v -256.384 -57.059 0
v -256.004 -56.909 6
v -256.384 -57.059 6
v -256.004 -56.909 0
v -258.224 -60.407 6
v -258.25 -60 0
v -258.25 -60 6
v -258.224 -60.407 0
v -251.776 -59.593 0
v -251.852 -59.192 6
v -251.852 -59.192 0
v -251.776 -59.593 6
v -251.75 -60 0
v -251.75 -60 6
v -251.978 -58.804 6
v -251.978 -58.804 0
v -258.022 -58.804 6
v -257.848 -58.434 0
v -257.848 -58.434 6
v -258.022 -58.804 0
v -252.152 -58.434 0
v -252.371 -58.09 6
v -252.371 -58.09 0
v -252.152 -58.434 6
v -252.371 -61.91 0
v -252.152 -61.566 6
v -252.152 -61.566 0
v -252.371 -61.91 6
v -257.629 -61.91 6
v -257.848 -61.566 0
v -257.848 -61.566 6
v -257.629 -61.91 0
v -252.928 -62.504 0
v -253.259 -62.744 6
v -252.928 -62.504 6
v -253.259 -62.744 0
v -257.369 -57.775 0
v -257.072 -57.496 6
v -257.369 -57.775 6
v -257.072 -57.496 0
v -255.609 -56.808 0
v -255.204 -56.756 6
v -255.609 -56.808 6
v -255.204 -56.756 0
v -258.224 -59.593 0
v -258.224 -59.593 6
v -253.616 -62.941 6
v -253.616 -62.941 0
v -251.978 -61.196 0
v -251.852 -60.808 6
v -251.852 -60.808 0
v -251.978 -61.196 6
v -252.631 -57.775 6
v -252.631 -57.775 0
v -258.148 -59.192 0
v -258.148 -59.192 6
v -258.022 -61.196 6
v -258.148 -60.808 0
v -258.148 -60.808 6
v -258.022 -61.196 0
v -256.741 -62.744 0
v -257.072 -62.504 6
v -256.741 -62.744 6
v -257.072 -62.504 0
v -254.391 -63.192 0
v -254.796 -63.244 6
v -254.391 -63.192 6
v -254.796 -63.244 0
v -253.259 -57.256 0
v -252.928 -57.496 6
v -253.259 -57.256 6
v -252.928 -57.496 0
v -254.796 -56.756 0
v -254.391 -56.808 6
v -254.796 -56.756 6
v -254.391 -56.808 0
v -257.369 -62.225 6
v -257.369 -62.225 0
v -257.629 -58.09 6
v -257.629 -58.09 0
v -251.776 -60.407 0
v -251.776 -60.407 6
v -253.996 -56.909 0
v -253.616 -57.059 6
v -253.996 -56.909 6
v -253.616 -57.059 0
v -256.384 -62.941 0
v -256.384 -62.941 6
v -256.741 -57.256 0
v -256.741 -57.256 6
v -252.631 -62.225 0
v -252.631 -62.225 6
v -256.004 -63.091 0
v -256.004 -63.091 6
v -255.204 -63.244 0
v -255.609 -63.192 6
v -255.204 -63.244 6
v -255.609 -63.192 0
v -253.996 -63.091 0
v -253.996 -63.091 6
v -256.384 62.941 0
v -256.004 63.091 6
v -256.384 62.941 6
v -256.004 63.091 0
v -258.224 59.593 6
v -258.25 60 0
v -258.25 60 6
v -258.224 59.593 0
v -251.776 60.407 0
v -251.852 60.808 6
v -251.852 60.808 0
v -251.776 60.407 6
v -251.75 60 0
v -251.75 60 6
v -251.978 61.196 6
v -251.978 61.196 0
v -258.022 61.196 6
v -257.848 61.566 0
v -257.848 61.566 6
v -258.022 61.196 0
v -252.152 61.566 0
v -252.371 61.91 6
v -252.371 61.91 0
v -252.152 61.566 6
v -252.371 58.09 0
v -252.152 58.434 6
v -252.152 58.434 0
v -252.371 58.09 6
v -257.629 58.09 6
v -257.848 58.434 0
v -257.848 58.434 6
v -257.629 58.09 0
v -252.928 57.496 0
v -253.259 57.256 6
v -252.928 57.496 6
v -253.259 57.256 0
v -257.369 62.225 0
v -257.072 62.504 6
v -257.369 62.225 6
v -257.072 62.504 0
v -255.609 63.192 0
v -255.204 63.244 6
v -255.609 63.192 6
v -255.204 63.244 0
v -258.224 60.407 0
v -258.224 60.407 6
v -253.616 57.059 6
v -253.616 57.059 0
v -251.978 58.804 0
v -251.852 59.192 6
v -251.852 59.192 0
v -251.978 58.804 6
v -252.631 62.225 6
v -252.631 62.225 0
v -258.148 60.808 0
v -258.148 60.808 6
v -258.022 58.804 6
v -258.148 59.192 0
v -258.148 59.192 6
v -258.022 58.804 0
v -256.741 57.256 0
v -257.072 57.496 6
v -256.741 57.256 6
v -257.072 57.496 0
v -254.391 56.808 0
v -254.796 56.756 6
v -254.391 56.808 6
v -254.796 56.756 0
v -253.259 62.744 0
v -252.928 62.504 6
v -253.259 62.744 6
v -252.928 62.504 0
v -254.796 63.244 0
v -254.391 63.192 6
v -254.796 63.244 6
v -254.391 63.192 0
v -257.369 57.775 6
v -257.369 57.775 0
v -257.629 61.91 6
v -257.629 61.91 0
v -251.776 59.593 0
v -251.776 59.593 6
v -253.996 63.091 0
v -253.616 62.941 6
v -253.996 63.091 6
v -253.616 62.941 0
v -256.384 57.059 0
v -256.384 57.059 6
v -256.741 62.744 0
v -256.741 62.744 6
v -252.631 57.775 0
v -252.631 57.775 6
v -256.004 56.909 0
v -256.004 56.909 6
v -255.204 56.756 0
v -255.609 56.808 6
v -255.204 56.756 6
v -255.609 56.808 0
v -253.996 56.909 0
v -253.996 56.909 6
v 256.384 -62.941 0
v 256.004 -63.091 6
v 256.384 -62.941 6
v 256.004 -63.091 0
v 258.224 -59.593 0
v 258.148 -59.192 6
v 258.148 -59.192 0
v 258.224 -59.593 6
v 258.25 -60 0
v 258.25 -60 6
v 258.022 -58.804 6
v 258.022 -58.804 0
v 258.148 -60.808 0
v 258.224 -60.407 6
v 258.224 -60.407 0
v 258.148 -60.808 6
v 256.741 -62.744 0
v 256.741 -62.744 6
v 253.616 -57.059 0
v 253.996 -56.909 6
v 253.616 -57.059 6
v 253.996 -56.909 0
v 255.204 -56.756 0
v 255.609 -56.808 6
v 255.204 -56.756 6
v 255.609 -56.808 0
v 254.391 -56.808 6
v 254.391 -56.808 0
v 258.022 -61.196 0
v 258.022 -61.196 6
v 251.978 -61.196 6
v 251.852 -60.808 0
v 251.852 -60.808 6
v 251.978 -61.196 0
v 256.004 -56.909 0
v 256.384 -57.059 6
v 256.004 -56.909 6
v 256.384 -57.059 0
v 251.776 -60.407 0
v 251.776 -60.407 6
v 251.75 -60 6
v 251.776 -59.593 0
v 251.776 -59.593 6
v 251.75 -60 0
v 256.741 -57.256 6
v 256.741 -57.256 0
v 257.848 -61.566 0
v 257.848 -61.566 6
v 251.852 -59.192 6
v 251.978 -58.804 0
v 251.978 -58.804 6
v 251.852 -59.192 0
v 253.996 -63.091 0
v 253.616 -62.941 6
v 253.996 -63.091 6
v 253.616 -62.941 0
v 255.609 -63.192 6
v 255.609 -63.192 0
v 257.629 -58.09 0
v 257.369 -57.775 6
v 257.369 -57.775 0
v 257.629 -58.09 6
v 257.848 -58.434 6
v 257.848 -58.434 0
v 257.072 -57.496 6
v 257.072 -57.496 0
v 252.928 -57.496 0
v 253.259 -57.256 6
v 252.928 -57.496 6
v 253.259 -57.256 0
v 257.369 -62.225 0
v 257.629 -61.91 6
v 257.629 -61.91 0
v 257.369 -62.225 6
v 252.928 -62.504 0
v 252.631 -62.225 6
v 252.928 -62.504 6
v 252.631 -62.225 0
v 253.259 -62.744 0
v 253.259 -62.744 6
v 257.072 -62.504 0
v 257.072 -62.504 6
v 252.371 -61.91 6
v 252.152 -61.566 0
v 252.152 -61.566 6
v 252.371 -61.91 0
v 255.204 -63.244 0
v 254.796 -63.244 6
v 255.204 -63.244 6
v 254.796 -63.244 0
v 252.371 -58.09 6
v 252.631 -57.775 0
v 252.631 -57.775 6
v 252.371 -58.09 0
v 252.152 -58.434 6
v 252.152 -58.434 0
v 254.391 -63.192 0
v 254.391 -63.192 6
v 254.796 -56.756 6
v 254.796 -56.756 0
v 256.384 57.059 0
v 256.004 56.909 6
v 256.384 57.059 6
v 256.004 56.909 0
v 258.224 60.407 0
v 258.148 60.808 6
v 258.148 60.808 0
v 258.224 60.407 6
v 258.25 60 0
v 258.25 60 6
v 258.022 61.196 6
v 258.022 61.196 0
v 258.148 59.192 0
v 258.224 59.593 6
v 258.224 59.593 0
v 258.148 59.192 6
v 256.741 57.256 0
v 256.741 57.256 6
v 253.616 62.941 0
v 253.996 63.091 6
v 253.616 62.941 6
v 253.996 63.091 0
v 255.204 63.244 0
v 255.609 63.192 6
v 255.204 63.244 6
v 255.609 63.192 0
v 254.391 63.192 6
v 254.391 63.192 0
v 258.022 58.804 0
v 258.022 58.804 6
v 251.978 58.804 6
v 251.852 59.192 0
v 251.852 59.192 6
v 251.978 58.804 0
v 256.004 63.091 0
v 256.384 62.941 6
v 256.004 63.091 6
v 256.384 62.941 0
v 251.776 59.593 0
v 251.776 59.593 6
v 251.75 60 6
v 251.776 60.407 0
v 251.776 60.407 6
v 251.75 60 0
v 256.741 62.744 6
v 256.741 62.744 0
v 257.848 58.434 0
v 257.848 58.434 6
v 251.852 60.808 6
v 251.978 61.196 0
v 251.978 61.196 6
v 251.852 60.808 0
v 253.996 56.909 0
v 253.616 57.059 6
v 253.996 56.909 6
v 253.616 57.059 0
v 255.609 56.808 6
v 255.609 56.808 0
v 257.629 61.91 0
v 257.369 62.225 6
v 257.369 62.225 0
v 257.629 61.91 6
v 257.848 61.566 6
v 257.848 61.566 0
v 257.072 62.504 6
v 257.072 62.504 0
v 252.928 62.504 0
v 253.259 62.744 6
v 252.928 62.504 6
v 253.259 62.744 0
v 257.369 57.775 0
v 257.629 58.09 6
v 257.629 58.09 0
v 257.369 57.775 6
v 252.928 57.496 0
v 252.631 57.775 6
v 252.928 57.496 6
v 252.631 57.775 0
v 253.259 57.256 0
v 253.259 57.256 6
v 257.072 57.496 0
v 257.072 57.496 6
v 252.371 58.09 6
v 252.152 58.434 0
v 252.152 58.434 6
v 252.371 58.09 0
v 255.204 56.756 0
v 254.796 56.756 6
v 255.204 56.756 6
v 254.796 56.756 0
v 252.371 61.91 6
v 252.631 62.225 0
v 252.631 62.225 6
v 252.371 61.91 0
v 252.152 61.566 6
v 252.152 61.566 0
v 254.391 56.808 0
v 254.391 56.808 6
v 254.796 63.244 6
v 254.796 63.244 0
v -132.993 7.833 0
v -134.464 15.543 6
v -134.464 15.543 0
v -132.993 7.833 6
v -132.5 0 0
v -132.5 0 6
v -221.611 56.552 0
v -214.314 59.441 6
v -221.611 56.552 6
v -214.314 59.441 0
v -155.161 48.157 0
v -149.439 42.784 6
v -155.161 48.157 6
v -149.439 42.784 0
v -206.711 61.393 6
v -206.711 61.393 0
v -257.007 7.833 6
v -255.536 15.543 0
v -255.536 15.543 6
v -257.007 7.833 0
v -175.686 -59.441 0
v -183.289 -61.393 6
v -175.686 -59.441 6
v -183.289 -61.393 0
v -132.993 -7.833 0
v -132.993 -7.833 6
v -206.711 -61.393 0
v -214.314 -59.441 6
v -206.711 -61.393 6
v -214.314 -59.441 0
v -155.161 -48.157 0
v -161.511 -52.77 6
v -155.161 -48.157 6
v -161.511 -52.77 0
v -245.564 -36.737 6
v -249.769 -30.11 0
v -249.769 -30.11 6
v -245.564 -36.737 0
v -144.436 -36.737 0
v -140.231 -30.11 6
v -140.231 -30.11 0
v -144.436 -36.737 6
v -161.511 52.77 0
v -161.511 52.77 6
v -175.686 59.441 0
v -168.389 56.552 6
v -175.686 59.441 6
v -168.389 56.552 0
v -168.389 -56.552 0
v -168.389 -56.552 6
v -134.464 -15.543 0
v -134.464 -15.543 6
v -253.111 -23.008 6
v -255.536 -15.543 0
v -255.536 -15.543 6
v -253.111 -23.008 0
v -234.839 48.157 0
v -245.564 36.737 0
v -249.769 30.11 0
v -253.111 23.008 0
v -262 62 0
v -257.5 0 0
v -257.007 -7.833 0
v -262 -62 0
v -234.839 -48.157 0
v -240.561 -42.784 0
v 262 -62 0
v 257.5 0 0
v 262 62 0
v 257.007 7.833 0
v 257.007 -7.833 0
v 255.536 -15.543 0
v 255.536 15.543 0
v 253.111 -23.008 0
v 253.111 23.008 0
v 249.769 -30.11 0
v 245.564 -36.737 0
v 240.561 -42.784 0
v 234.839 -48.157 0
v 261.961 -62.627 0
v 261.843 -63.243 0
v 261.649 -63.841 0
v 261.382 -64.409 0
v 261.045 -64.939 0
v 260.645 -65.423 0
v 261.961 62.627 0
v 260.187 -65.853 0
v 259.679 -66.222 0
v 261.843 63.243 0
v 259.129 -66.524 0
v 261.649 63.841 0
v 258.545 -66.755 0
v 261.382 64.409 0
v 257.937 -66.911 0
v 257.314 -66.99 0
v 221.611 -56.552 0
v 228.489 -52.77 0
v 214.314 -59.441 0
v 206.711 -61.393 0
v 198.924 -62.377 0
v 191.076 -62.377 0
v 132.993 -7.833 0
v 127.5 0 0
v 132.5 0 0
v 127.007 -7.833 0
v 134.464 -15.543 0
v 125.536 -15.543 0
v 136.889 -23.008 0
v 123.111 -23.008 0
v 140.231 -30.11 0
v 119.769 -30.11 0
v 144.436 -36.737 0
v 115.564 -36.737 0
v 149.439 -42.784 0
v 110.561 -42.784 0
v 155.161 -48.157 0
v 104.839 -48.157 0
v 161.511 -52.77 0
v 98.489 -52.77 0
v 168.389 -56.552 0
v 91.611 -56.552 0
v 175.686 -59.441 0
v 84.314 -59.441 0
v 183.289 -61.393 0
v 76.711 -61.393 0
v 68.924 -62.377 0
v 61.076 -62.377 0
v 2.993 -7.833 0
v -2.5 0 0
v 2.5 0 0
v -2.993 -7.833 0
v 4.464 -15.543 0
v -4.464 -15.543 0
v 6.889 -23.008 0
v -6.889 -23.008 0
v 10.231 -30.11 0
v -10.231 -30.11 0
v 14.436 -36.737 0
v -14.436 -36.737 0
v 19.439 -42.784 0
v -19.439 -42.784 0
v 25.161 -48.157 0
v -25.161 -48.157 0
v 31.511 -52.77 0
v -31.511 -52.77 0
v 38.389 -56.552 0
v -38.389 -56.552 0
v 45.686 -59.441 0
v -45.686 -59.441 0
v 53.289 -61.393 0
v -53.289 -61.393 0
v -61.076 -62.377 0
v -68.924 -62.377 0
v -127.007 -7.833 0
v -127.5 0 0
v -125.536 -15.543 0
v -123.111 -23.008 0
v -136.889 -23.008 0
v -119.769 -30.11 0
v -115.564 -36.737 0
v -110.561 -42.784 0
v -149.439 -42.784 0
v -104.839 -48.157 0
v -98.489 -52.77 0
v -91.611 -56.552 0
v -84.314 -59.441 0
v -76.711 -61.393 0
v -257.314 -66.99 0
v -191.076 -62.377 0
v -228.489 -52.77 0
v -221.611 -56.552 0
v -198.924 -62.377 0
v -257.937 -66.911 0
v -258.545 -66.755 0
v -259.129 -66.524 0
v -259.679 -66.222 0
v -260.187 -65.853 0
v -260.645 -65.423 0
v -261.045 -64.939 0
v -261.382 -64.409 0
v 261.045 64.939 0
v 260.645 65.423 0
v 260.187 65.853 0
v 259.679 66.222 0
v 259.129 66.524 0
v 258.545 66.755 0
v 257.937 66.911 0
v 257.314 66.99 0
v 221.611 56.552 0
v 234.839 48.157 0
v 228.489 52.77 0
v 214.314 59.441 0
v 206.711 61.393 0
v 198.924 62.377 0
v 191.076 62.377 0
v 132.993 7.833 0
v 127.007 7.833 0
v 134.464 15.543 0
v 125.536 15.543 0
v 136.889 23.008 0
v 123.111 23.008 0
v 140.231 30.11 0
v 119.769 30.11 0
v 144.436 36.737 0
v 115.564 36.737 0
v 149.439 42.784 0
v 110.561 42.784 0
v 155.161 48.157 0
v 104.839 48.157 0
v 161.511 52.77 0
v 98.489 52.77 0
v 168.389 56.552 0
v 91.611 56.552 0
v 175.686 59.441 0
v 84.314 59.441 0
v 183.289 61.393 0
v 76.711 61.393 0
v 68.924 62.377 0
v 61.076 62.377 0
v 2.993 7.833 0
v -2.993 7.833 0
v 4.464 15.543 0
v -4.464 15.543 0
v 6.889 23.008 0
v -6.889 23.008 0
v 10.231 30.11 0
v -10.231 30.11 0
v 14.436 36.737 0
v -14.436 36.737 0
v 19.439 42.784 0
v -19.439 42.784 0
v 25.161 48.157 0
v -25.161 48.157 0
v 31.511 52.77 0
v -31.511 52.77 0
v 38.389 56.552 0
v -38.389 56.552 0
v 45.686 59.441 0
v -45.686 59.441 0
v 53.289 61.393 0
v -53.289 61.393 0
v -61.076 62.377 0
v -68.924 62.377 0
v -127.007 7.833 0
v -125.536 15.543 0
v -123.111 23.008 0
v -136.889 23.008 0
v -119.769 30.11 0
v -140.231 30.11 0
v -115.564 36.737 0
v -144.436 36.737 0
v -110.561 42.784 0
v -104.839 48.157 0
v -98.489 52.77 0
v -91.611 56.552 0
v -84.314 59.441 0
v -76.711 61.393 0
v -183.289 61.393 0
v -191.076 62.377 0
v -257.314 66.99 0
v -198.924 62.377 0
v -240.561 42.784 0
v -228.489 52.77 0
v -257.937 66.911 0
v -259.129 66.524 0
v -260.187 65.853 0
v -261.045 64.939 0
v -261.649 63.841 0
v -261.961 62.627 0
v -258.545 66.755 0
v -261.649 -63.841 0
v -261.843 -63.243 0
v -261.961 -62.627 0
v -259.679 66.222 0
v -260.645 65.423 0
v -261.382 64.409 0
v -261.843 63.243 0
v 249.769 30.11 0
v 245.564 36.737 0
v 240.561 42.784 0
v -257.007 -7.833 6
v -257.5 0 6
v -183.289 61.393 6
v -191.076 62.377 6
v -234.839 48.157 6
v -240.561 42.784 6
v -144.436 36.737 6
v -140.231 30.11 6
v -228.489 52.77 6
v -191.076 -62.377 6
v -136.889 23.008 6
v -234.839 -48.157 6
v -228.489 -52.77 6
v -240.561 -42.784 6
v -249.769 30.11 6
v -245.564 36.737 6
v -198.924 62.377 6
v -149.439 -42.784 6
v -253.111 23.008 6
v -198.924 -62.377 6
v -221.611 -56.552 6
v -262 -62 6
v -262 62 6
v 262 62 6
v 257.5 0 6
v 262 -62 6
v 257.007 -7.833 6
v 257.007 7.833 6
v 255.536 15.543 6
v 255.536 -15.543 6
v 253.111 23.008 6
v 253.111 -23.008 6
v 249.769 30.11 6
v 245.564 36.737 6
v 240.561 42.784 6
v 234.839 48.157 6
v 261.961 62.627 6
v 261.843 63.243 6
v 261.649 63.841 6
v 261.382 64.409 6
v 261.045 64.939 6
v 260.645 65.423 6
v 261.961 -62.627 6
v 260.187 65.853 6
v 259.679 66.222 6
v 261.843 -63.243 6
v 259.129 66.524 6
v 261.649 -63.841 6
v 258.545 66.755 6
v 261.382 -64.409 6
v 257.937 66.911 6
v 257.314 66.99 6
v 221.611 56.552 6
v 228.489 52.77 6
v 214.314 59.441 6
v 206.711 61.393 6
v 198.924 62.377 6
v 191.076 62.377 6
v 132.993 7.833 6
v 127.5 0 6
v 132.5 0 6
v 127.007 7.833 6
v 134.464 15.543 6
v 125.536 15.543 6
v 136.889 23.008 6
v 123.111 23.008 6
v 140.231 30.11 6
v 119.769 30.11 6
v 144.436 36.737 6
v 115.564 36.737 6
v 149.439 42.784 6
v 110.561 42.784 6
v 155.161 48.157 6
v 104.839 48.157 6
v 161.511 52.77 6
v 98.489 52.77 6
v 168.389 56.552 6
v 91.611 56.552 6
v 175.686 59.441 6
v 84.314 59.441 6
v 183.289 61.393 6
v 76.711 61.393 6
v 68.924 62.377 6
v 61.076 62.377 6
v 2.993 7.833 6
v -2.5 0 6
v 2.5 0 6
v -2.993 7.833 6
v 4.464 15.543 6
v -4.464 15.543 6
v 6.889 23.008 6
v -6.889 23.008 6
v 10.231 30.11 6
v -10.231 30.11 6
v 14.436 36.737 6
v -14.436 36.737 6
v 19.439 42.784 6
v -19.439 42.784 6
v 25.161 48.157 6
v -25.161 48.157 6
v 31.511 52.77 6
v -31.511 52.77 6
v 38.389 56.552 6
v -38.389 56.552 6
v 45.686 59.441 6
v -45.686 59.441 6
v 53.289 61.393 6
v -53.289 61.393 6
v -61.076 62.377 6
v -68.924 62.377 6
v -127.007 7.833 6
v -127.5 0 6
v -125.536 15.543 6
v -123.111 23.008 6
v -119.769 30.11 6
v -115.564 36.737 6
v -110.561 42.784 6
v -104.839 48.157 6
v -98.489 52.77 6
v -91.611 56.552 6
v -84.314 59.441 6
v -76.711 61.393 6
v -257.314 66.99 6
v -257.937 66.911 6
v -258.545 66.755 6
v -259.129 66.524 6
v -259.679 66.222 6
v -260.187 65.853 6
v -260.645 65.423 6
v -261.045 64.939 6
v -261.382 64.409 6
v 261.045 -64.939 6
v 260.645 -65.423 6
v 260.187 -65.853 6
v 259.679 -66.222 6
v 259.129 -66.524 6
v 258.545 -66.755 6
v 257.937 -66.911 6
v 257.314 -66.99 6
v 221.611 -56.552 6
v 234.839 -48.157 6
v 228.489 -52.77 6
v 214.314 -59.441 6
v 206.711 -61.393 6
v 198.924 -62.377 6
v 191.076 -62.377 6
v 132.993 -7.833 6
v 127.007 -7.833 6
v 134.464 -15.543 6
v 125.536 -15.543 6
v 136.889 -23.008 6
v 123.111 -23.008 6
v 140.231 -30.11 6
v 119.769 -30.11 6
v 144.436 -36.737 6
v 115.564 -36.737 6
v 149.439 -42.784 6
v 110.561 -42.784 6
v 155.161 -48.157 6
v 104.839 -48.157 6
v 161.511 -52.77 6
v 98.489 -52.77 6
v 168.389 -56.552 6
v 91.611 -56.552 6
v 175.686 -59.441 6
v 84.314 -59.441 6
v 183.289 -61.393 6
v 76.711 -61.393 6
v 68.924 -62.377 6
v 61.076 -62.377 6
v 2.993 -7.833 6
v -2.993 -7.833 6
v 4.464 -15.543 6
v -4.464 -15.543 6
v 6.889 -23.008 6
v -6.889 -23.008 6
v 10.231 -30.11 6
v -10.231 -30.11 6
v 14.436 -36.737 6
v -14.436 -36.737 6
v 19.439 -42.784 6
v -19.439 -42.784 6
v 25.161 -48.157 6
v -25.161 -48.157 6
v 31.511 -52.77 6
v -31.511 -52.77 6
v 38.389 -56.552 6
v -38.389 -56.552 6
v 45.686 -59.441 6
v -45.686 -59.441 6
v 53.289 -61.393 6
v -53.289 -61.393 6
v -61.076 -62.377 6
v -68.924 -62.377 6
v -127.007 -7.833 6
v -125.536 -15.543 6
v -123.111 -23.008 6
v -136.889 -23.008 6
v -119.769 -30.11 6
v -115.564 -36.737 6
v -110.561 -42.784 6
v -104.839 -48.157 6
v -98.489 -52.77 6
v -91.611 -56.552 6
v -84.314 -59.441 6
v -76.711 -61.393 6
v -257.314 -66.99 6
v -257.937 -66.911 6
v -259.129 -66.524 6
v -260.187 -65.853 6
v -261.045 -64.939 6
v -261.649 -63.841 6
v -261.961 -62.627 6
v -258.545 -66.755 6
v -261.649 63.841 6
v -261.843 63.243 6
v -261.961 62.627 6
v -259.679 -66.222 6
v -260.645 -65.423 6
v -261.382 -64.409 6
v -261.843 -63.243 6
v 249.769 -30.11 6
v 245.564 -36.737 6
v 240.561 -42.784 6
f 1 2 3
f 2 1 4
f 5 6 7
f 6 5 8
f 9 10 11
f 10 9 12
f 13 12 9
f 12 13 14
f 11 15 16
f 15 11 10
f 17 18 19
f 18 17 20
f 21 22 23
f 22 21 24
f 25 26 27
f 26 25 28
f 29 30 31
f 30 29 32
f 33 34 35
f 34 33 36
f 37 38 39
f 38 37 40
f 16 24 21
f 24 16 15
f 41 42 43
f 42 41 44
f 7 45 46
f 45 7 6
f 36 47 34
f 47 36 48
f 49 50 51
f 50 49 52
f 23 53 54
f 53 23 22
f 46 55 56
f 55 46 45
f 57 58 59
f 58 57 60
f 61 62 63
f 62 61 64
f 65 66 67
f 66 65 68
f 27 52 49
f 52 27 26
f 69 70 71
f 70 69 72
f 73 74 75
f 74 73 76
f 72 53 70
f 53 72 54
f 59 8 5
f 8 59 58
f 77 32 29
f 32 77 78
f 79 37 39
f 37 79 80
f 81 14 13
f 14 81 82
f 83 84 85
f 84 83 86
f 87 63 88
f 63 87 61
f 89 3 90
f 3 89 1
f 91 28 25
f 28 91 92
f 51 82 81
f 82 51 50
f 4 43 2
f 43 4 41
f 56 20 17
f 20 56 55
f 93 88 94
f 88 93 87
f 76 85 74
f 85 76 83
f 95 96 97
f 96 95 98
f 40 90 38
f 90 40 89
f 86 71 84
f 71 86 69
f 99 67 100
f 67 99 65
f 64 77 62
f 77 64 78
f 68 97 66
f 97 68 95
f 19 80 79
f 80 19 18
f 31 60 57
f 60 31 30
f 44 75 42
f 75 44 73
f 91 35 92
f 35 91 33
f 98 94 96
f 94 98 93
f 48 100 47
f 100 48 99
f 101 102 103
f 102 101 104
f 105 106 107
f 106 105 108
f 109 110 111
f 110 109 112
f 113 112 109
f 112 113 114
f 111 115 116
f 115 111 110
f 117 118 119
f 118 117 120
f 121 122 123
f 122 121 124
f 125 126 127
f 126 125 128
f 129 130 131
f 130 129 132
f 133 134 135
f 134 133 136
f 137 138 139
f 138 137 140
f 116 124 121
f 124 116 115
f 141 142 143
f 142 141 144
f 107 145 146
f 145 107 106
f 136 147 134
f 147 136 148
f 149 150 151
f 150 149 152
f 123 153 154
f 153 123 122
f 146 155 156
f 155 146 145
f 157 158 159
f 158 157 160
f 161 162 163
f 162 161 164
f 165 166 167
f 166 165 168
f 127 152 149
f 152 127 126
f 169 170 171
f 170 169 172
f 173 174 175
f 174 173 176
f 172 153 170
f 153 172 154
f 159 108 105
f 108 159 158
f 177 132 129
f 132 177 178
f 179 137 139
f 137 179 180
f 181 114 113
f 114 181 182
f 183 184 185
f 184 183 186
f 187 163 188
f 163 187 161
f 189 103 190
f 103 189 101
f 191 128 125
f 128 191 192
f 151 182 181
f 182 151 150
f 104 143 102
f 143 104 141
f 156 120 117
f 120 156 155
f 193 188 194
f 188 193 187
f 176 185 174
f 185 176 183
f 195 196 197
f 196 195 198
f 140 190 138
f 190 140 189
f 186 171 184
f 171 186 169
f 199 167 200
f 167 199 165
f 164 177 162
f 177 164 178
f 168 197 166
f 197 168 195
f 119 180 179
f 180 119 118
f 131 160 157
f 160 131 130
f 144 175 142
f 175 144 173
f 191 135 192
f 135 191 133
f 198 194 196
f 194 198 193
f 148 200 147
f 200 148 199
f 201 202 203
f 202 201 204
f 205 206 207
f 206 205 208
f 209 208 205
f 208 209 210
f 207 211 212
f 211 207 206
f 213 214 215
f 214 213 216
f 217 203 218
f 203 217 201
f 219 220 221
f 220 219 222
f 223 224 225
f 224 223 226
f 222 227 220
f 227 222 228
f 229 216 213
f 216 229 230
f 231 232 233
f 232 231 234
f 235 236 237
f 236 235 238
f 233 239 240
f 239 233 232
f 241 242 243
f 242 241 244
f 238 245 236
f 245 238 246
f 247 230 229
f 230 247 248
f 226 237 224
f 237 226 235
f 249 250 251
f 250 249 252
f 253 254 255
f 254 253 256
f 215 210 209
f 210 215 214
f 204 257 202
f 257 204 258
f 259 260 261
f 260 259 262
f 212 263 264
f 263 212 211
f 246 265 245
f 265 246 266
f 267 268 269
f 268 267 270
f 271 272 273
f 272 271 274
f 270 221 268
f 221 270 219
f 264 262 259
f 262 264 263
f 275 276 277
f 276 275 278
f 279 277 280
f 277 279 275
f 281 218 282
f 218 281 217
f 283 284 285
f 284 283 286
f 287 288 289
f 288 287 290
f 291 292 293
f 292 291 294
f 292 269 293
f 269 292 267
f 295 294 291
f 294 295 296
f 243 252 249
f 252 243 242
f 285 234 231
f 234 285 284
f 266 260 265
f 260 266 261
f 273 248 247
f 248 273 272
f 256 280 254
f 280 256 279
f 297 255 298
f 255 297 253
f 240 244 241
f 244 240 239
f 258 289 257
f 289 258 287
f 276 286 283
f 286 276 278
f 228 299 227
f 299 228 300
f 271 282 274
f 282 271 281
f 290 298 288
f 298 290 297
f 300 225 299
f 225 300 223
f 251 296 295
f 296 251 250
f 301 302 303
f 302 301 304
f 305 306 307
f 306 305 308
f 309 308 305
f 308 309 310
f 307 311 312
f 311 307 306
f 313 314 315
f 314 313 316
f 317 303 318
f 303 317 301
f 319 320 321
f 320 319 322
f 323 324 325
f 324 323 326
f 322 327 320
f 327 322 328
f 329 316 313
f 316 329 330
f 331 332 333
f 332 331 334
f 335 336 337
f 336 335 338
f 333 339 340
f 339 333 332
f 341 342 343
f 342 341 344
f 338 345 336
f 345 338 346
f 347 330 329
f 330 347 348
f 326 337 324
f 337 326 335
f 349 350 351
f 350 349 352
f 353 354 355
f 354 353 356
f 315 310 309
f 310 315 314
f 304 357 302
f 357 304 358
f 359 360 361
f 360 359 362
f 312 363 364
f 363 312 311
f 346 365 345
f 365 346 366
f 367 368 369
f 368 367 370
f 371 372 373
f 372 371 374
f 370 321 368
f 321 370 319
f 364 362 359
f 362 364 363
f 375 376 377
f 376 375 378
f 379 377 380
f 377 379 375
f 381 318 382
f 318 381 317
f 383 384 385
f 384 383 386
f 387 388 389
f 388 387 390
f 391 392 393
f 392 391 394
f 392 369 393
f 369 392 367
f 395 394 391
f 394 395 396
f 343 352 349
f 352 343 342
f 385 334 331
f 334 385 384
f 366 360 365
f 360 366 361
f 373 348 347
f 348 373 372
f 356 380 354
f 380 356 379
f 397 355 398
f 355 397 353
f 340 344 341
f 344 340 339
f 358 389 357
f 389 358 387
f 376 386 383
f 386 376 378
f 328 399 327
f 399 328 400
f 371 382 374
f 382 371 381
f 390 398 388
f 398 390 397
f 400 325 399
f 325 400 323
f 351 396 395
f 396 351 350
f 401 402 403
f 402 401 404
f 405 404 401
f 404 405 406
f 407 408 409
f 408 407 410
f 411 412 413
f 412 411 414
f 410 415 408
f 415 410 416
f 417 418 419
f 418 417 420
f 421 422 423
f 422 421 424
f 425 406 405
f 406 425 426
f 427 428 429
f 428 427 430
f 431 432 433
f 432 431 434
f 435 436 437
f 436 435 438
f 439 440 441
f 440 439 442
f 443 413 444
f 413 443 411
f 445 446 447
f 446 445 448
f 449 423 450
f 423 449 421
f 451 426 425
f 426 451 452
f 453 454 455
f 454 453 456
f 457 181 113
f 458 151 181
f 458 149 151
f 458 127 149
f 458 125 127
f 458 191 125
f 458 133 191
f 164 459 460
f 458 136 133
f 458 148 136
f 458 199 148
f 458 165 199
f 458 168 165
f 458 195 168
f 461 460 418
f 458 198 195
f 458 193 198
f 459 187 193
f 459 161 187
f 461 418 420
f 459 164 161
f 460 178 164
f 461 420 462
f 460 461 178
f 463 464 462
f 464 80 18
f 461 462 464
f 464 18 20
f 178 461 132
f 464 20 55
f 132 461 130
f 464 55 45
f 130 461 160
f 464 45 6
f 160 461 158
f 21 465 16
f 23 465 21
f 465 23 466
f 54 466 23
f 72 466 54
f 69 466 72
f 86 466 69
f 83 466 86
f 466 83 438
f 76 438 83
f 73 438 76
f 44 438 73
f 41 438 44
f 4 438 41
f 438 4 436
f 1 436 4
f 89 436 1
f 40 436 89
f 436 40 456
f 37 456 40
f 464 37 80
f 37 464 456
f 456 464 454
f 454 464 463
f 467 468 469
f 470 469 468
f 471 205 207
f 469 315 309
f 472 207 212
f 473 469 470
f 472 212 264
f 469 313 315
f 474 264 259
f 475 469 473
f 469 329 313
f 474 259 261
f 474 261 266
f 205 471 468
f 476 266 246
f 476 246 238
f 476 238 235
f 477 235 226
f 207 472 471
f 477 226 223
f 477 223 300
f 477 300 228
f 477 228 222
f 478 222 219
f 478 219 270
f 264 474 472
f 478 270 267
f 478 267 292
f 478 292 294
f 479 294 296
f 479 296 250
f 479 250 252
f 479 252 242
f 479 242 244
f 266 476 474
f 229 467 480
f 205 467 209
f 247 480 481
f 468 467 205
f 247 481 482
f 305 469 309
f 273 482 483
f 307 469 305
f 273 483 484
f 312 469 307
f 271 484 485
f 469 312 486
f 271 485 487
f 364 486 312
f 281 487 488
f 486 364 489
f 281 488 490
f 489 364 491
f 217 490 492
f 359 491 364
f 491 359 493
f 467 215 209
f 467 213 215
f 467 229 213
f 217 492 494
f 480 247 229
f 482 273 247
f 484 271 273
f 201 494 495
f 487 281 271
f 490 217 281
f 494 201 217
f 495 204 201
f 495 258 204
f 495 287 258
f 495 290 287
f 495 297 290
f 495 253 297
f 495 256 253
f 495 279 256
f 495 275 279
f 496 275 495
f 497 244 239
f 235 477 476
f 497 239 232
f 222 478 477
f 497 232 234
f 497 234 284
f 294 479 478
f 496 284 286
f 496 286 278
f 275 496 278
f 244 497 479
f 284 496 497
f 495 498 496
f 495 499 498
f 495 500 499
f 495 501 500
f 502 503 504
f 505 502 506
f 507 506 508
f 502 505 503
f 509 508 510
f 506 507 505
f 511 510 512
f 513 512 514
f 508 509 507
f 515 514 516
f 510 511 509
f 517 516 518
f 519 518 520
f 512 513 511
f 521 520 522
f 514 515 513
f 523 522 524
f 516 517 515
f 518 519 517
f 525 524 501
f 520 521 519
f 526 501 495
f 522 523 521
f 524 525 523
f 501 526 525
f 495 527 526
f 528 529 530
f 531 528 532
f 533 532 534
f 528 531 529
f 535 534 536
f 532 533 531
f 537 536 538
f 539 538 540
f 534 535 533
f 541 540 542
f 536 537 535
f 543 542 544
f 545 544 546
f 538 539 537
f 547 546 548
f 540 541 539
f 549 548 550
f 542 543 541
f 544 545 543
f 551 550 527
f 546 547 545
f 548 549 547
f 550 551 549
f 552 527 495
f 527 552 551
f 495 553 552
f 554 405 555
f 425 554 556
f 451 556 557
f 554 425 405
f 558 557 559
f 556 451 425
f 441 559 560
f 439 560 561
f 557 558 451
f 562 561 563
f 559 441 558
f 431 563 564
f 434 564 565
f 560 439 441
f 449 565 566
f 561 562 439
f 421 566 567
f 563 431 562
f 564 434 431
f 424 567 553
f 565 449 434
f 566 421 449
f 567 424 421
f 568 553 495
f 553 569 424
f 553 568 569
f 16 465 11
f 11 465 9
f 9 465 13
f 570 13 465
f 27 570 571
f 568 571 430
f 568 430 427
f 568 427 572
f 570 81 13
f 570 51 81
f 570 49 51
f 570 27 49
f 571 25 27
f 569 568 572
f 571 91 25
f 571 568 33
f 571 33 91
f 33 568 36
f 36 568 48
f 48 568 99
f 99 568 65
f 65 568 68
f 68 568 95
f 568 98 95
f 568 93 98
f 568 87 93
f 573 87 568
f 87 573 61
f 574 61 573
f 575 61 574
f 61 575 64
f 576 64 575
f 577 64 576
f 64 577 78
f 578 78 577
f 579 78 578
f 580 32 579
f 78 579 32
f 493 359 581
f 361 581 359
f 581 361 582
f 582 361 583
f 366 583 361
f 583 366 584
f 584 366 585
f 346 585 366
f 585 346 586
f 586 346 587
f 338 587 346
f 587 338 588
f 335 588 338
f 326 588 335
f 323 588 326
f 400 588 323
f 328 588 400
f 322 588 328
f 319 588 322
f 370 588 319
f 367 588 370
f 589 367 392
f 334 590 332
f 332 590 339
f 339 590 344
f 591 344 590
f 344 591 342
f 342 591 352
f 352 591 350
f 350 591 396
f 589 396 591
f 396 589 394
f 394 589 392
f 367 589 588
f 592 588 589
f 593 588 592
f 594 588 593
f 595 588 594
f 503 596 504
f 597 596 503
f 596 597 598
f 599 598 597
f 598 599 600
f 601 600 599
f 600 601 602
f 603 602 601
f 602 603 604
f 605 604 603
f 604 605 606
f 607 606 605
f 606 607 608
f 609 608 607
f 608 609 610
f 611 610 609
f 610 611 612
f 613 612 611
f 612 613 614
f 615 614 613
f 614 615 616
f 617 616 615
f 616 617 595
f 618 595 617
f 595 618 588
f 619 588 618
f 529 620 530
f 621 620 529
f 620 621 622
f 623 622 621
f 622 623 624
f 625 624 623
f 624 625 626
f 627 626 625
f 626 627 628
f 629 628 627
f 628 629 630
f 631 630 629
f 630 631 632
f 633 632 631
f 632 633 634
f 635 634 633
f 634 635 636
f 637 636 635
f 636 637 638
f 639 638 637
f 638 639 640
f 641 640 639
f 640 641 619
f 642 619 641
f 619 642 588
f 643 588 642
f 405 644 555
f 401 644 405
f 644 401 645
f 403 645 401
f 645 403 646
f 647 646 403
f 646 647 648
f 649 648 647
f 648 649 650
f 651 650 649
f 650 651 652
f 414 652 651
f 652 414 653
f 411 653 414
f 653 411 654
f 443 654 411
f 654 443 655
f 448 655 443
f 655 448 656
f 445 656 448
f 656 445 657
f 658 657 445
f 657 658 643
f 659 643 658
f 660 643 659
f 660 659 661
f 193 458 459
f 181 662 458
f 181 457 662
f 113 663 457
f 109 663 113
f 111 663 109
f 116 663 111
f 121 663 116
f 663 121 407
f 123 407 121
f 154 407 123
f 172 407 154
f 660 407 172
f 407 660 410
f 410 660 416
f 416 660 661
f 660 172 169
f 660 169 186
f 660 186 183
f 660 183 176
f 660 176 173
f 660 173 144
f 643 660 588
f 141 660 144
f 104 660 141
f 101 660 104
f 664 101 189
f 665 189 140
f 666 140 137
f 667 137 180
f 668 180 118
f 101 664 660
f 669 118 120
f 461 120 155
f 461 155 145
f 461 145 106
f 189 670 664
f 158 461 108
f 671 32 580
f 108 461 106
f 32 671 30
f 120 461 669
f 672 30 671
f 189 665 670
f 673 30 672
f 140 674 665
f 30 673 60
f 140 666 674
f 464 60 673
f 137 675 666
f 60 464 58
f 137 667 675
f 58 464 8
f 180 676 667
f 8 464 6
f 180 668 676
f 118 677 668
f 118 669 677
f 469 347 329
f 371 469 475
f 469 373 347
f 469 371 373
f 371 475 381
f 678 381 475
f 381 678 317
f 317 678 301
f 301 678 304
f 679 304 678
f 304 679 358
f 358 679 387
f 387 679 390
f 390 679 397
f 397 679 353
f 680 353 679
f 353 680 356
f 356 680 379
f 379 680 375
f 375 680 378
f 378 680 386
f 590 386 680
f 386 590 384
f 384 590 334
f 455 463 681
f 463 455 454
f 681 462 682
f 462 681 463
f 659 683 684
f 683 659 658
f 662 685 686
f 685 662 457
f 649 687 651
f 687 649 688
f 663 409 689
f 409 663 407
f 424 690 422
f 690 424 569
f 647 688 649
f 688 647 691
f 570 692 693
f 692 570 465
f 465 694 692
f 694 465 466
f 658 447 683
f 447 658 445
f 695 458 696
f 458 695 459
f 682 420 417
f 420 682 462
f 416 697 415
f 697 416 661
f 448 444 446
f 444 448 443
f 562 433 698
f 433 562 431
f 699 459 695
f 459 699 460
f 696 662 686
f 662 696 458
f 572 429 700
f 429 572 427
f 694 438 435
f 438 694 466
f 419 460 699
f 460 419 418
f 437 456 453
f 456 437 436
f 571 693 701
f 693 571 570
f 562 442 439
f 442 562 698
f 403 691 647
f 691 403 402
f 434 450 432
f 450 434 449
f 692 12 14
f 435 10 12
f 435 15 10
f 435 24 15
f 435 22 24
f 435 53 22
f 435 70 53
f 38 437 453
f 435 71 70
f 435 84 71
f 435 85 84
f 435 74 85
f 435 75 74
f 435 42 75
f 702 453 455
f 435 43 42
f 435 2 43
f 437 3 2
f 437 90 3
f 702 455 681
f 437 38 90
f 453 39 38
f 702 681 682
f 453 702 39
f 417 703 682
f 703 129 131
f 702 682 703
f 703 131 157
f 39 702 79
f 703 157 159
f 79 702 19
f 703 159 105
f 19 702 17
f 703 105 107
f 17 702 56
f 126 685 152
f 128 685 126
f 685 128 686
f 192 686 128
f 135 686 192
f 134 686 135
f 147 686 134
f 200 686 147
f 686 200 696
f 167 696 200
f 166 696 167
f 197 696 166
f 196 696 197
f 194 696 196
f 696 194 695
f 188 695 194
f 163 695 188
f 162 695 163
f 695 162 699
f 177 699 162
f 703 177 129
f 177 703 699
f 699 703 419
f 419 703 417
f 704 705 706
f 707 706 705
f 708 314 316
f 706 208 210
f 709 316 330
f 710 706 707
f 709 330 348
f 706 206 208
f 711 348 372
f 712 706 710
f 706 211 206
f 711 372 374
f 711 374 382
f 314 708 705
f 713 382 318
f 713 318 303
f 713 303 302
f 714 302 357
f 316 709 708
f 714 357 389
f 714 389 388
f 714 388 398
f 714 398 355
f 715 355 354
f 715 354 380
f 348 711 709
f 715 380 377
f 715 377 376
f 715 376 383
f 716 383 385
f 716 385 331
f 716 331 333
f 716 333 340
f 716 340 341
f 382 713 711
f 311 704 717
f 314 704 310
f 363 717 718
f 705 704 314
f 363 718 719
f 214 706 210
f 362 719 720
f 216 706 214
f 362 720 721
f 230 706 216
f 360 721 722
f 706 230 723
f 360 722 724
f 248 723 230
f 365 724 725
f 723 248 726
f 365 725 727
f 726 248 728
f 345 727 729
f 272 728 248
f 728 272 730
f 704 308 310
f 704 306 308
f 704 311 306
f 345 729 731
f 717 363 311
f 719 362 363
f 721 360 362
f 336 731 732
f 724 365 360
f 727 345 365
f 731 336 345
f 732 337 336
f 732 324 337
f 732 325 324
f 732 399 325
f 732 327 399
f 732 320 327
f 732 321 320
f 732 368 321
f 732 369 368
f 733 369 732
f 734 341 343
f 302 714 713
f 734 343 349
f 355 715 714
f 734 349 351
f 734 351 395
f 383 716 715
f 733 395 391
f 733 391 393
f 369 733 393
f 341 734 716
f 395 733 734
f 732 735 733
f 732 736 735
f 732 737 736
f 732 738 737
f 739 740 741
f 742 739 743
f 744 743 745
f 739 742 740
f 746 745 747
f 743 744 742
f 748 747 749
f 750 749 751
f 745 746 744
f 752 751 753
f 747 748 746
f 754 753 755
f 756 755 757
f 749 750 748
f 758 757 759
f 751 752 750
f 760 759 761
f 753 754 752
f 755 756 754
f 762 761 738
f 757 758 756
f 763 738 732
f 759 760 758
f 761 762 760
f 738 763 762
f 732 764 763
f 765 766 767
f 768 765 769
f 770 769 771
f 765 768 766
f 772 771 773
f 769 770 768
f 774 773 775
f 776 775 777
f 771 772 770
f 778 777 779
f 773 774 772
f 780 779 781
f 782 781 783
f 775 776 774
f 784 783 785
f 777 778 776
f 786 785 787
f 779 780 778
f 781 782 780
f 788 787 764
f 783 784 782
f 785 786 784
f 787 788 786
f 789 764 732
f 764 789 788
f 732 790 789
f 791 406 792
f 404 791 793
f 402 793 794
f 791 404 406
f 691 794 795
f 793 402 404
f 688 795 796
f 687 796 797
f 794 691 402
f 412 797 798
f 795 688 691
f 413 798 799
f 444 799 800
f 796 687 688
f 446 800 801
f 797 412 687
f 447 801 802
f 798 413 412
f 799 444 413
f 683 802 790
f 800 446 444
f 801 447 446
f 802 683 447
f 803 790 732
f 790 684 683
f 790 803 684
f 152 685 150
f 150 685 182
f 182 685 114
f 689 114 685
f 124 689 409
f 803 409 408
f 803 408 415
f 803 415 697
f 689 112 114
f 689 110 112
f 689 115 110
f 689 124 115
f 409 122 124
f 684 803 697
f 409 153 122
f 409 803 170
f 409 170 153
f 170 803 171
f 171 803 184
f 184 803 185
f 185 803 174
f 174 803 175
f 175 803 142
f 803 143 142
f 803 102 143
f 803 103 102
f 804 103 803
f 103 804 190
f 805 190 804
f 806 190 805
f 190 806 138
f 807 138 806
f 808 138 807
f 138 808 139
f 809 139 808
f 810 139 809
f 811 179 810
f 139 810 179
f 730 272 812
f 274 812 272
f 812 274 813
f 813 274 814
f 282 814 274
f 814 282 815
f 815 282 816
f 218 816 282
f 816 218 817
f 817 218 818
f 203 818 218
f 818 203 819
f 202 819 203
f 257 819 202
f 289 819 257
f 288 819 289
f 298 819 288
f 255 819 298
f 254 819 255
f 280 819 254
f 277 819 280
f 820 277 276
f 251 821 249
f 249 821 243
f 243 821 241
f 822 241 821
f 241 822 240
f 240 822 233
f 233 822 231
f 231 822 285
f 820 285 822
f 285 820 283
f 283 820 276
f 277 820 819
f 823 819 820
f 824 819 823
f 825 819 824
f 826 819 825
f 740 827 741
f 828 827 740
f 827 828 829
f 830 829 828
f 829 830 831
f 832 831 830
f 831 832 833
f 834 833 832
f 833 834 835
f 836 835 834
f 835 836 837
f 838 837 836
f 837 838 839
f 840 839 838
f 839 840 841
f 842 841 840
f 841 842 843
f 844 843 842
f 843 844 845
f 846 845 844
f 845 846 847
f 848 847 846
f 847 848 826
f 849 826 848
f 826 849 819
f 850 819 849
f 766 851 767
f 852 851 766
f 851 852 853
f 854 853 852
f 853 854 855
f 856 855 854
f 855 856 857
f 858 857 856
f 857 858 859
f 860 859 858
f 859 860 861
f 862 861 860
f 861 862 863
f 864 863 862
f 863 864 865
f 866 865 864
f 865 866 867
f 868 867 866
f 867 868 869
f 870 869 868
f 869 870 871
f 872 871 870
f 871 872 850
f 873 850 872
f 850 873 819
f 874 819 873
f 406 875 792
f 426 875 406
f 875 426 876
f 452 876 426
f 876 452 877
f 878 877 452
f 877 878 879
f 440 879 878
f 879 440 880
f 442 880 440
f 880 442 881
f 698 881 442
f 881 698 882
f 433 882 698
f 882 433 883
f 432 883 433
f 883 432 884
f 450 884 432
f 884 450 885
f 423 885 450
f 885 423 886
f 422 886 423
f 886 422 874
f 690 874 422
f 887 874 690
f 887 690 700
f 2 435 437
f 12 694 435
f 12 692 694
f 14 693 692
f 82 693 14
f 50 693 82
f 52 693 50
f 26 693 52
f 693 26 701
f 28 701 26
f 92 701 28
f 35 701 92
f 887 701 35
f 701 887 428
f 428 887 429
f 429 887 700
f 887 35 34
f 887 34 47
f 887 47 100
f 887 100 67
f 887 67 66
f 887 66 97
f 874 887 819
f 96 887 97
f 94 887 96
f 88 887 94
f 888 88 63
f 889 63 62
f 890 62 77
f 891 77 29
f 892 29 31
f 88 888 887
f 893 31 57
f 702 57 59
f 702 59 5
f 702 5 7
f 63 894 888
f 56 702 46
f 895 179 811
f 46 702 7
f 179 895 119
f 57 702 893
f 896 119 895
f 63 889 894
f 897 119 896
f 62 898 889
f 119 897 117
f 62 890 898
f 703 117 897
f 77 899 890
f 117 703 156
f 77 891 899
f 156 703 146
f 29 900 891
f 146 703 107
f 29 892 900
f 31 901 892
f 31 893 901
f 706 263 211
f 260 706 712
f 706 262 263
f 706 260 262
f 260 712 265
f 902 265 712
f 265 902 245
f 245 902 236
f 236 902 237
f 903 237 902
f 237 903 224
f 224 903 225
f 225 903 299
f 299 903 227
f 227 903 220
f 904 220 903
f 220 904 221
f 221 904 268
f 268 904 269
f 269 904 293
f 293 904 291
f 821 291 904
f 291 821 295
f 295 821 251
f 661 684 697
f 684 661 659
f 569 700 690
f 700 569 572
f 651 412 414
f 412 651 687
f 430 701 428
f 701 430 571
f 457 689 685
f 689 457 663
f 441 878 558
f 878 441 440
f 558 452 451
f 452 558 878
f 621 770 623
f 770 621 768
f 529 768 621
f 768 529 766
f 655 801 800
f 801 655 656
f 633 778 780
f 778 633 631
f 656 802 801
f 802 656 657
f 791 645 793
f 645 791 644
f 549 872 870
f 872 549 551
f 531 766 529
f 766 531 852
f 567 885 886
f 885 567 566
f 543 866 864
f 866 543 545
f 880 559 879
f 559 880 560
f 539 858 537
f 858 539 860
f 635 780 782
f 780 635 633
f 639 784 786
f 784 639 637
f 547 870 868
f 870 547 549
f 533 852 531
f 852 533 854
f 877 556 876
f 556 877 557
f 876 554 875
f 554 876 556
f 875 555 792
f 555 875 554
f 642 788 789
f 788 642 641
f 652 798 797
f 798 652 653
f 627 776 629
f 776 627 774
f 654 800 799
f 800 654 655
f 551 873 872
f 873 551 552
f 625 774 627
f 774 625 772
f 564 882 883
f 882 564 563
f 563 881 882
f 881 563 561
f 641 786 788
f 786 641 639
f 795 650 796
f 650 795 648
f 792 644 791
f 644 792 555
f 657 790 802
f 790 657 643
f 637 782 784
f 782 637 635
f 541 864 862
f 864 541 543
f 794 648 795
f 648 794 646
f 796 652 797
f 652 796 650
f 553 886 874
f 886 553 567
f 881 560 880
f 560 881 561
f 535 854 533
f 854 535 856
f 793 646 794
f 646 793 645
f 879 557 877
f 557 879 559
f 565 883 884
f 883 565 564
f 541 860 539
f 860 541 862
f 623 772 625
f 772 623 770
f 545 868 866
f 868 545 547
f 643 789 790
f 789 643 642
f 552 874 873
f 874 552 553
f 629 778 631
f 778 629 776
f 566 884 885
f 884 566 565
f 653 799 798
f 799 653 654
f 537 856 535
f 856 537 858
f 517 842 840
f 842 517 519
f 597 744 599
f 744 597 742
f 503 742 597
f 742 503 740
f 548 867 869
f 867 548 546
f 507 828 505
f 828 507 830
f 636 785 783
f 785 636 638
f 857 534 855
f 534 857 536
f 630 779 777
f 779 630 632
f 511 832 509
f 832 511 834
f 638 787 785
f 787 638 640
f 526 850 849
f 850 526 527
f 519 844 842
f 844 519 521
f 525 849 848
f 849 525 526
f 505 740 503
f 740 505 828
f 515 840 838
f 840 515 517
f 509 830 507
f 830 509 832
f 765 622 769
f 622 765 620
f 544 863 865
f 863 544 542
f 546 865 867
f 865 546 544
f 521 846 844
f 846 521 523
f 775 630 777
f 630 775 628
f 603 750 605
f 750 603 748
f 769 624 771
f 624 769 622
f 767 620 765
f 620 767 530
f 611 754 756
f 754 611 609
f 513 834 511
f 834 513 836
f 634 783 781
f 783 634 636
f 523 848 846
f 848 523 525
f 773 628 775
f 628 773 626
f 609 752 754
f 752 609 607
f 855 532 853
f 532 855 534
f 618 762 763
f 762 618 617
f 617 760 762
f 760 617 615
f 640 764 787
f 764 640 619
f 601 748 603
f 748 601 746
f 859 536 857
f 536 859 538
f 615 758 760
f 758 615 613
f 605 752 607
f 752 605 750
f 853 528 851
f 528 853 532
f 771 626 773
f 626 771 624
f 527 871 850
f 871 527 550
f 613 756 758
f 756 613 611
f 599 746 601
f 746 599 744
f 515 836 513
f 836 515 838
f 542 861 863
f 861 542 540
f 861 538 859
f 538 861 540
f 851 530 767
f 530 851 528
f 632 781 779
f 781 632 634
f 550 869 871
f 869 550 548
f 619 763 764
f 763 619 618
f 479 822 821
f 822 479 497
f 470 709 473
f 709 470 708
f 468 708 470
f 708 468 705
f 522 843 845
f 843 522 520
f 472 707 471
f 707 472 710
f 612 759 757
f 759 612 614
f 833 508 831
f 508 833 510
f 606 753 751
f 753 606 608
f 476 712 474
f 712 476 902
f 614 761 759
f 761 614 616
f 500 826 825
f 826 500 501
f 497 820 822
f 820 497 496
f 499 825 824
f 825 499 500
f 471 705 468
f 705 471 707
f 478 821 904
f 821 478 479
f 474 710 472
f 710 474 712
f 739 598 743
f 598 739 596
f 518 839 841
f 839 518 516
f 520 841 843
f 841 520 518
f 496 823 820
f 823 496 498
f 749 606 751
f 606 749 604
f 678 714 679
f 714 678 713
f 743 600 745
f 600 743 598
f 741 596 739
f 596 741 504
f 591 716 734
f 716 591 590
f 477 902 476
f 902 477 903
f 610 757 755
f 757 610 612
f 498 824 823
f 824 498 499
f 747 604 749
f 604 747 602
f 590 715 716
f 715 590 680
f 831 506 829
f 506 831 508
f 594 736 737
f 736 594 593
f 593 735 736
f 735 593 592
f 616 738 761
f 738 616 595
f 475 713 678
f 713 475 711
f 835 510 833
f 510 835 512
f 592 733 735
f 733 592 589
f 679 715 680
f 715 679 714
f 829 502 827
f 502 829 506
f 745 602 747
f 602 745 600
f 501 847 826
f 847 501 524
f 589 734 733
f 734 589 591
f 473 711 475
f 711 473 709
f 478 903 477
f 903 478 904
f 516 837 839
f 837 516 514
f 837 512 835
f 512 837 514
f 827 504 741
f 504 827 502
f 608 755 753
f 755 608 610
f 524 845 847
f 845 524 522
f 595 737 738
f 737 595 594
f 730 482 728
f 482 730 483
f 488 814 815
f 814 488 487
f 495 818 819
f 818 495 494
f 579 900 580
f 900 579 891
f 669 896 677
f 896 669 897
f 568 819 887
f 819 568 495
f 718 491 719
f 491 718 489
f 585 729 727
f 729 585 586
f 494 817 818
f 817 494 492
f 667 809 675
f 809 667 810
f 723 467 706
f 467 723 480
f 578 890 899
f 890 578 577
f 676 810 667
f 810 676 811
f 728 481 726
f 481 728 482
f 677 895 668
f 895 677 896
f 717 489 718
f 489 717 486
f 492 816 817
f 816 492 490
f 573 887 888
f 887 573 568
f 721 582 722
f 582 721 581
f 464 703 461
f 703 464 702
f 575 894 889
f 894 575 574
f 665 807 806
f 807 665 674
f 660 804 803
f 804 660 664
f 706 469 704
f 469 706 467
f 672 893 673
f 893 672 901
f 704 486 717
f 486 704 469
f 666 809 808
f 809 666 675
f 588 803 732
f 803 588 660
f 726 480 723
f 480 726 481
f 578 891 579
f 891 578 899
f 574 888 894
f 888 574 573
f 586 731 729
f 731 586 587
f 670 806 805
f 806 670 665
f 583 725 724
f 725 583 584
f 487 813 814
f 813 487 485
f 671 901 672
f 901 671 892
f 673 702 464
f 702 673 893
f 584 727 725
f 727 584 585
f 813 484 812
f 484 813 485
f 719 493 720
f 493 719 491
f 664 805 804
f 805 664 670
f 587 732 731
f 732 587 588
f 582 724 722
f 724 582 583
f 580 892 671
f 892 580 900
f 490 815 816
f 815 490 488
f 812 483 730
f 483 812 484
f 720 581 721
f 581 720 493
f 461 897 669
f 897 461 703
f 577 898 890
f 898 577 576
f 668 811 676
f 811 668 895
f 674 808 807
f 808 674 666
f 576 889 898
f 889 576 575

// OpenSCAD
$fn = 50;


difference() {
	union() {
		hull() {
			translate(v = [-257.0000000000, 62.0000000000, 0]) {
				cylinder(h = 6, r = 5);
			}
			translate(v = [257.0000000000, 62.0000000000, 0]) {
				cylinder(h = 6, r = 5);
			}
			translate(v = [-257.0000000000, -62.0000000000, 0]) {
				cylinder(h = 6, r = 5);
			}
			translate(v = [257.0000000000, -62.0000000000, 0]) {
				cylinder(h = 6, r = 5);
			}
		}
	}
	union() {
		#translate(v = [-255.0000000000, -60.0000000000, -100.0000000000]) {
			cylinder(h = 200, r = 3.2500000000);
		}
		#translate(v = [-255.0000000000, 60.0000000000, -100.0000000000]) {
			cylinder(h = 200, r = 3.2500000000);
		}
		#translate(v = [255.0000000000, -60.0000000000, -100.0000000000]) {
			cylinder(h = 200, r = 3.2500000000);
		}
		#translate(v = [255.0000000000, 60.0000000000, -100.0000000000]) {
			cylinder(h = 200, r = 3.2500000000);
		}
		#translate(v = [-195.0000000000, 0, 0]) {
			cylinder(h = 6, r = 62.5000000000);
		}
		#translate(v = [-65.0000000000, 0, 0]) {
			cylinder(h = 6, r = 62.5000000000);
		}
		#translate(v = [65.0000000000, 0, 0]) {
			cylinder(h = 6, r = 62.5000000000);
		}
		#translate(v = [195.0000000000, 0, 0]) {
			cylinder(h = 6, r = 62.5000000000);
		}
	}
}
